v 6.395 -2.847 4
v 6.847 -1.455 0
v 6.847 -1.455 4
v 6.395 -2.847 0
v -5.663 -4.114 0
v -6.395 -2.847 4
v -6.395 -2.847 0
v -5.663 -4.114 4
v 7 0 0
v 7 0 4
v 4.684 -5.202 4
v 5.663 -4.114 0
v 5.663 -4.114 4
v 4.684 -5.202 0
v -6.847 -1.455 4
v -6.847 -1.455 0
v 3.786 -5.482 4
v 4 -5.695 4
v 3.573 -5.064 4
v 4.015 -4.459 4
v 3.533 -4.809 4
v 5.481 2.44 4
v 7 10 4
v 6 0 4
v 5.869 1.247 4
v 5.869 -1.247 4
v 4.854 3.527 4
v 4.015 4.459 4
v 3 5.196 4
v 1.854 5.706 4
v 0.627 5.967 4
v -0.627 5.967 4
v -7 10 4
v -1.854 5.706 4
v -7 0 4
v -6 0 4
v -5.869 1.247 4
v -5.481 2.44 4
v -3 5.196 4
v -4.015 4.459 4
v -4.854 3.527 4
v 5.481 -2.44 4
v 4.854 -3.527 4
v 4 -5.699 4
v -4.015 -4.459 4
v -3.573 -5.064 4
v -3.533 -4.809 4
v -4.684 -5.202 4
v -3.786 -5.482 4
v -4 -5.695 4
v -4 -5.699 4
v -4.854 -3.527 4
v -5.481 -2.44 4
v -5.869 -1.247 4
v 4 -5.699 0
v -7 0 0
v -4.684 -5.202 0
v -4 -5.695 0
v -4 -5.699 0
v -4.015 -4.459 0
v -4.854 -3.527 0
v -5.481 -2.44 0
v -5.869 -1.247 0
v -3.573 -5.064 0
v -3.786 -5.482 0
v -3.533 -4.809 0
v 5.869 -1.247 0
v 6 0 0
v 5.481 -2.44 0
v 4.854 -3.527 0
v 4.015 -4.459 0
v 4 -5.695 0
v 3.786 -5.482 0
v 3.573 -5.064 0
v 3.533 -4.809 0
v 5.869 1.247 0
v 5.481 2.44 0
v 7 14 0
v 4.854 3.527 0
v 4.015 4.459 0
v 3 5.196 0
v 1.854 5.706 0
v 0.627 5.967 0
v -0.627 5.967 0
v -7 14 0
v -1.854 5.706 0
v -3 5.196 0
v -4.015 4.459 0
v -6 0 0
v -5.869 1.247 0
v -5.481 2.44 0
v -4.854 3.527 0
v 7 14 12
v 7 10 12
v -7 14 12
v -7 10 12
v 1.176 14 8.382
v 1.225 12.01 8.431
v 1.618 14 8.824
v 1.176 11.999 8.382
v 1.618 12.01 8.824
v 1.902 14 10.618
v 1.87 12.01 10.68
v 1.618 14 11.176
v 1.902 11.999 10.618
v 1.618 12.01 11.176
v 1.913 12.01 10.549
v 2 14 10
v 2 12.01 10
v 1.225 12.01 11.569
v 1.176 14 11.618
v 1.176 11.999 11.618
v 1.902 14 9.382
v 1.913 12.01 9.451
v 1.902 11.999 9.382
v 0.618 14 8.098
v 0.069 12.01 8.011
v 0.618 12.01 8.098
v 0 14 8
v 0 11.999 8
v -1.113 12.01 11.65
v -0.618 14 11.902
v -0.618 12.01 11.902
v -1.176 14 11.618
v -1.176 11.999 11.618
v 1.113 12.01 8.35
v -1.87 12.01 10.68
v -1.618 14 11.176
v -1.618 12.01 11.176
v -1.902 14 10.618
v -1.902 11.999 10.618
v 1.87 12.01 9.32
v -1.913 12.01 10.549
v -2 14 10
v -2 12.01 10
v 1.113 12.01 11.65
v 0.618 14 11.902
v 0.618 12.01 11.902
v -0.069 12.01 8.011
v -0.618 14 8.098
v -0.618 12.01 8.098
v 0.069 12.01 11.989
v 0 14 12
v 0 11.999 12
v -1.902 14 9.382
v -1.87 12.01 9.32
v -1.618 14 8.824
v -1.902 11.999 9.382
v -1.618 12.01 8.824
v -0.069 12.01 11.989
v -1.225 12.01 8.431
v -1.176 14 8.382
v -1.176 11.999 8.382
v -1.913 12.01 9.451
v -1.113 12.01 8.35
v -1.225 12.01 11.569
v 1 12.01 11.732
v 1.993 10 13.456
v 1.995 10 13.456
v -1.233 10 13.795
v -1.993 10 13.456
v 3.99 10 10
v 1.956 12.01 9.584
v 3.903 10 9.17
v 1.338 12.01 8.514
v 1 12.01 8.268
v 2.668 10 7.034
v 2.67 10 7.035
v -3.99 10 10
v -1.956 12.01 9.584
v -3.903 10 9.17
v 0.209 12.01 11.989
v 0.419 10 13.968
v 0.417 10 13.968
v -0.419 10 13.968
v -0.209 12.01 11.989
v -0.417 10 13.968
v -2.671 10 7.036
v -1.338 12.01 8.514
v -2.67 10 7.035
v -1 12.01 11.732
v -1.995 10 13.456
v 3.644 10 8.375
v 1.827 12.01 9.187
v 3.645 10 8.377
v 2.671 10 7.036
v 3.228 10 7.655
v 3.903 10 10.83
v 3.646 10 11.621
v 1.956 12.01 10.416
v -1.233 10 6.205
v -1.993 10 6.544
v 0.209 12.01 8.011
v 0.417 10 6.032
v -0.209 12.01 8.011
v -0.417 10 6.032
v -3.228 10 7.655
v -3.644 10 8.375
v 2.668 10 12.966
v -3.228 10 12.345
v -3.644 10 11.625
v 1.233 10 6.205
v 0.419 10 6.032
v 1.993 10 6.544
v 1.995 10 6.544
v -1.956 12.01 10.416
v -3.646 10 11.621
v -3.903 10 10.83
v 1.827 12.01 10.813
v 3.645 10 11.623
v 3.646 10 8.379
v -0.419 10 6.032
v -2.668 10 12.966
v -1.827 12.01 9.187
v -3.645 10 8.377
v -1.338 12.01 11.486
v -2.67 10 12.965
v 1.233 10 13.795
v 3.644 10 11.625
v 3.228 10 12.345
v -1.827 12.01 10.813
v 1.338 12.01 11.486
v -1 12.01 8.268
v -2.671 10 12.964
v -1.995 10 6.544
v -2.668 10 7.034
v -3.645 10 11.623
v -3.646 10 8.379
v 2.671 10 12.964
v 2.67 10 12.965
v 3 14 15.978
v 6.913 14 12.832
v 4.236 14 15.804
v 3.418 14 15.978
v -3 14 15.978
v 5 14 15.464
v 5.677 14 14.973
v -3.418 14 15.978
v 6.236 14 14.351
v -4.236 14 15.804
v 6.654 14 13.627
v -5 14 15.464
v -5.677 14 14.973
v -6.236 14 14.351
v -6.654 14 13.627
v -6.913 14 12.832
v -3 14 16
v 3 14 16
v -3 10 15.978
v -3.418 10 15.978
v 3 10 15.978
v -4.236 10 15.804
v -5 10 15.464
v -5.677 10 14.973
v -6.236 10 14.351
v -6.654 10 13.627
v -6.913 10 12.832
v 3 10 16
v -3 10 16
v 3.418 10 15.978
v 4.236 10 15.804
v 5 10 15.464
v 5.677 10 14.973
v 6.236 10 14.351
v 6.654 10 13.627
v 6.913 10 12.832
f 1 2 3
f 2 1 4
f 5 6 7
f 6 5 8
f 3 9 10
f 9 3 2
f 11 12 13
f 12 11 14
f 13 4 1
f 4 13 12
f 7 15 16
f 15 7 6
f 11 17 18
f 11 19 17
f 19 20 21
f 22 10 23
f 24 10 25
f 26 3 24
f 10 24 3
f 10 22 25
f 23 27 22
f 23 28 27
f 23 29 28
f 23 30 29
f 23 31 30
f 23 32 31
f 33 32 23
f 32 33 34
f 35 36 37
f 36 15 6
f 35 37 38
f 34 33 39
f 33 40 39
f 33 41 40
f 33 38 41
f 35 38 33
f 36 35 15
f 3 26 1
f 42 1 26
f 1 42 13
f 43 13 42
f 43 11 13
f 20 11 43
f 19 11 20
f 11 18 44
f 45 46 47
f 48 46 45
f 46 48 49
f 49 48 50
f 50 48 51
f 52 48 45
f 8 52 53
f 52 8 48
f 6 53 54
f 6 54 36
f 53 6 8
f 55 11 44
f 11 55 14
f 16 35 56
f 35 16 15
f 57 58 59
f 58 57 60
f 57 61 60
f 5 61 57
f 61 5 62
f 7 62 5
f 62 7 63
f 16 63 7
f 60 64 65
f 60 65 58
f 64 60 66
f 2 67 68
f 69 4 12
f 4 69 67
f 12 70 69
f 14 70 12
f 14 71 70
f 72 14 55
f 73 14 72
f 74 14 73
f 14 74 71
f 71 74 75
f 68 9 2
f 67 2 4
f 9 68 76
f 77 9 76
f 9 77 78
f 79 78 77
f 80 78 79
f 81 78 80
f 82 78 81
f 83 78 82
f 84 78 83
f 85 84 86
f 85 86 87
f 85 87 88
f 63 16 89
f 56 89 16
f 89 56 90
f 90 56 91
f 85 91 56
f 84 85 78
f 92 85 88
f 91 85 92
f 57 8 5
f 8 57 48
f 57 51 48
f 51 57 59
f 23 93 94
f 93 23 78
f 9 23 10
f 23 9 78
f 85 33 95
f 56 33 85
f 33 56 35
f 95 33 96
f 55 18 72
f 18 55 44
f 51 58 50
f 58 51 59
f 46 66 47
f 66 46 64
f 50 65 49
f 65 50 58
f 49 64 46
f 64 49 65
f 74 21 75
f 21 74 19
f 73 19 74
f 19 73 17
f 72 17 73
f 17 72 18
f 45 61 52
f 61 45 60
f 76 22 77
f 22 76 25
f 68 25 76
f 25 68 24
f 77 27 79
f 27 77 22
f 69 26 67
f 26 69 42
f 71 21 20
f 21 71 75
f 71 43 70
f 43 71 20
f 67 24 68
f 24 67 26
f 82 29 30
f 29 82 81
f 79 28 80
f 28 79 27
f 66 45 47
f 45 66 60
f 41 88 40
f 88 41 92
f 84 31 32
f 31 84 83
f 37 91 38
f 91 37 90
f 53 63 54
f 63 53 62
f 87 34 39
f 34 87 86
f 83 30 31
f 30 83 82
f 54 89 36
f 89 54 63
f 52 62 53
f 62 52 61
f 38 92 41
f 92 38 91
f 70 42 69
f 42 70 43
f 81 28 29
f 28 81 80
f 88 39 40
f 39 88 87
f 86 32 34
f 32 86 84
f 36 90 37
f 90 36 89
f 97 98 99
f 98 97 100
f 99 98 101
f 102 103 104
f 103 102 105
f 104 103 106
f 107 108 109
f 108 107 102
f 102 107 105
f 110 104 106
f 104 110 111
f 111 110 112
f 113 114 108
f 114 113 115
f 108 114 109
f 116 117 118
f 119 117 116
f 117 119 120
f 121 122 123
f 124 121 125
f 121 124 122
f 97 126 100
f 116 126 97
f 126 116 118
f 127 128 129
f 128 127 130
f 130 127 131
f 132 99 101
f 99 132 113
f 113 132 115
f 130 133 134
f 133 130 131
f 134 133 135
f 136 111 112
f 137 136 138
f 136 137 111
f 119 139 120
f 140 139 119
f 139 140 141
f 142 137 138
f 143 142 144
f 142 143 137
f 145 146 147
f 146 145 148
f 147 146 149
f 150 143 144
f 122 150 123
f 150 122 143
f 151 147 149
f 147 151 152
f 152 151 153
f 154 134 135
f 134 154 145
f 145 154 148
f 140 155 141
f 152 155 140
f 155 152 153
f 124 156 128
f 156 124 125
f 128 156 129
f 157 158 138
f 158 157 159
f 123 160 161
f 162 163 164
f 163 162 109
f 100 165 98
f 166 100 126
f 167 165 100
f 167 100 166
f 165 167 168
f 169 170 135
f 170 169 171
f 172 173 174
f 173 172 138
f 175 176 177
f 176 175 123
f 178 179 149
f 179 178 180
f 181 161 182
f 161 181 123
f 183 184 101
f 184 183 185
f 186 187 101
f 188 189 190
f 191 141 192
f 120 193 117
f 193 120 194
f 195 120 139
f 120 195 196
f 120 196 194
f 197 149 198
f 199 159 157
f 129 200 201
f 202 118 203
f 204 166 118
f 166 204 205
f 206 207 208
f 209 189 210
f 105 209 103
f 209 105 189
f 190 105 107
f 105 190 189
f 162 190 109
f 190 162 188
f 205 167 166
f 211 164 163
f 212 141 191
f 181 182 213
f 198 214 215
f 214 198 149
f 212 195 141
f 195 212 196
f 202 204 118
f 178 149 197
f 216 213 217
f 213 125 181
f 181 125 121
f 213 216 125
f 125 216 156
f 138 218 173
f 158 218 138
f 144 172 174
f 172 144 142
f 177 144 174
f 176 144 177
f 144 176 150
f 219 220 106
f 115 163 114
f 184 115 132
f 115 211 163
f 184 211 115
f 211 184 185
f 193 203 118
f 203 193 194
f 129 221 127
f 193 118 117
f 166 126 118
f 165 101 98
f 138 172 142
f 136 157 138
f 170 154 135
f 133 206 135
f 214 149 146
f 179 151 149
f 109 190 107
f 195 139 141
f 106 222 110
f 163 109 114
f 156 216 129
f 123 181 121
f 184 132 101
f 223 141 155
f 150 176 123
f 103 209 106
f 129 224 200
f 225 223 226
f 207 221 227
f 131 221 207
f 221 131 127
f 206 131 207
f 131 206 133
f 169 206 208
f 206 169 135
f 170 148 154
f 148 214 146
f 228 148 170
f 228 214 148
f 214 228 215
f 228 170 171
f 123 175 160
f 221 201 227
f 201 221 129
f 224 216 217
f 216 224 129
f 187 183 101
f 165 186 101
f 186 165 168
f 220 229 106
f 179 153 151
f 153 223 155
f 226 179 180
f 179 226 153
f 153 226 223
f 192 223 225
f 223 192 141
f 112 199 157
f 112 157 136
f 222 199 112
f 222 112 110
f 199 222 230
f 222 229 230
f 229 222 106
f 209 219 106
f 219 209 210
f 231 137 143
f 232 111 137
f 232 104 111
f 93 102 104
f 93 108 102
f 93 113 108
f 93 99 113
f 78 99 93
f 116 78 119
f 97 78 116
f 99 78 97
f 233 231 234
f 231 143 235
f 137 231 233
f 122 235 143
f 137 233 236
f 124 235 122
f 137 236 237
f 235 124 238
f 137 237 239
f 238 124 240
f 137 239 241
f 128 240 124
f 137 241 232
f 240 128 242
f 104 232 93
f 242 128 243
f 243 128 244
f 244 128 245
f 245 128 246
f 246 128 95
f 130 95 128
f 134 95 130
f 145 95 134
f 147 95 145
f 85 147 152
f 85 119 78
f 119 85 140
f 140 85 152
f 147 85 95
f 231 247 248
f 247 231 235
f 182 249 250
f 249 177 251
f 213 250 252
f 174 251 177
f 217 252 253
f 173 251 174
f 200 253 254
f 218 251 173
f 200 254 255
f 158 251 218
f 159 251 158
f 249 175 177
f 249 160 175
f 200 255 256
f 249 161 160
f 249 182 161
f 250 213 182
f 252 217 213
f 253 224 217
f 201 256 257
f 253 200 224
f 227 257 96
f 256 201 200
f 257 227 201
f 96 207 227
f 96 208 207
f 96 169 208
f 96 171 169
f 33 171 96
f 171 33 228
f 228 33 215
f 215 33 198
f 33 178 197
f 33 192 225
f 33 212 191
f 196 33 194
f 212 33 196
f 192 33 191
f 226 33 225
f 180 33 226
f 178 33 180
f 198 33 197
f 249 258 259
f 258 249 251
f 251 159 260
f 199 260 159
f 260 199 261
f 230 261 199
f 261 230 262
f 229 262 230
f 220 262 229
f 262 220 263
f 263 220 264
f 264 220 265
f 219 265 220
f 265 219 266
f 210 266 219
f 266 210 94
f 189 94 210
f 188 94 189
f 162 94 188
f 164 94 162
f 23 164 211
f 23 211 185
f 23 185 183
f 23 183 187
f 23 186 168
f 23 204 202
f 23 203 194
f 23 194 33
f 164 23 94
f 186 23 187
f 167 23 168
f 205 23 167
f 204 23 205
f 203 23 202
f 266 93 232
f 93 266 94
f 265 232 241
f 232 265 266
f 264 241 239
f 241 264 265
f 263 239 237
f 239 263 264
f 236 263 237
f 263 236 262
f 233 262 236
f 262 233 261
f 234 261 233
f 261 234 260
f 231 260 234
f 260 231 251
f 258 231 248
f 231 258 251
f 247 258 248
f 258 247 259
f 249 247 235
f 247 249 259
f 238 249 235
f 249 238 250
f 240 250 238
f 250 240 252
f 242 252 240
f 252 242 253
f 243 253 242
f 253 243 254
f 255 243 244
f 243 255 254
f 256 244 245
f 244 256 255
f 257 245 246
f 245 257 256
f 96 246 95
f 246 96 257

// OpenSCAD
*translate([-40,-10]) difference(){
  union(){
    cylinder(d=44,h=4,$fn=80);
    translate([-22,0]) cube([44,22,4]);
  }
  translate([0,0,-.01]) cylinder(d=40,h=4.02,$fn=80);
  difference(){
    translate([-16,-22.01,-.01]) cube([32,10,4.02]);
    translate([-17,-13.5,-.02]) cylinder(d=4,h=4.04,$fn=20);
    translate([17,-13.5,-.02]) cylinder(d=4,h=4.04,$fn=20);
  }
}
difference(){
  union(){
    cylinder(d=14,h=4,$fn=30);
    translate([-7,0]) cube([14,12,4]);
  }
  translate([0,0,-.01]) {
    cylinder(d=12,h=4.02,$fn=30);
    difference(){
      translate([-4,-8]) cube([8,8,4.02]);
      translate([-5,-4.6,-.01]) cylinder(d=3,h=4.04,$fn=20);
      translate([5,-4.6,-.01]) cylinder(d=3,h=4.04,$fn=20);
    }
  }
}
translate([-62,10]) {
  difference(){
    bw=14;
    *cube([bw,4,20]);
    translate([55,4]) rotate([90,0]) linear_extrude(4) union(){
      square([bw,12]);
      translate([4,12]) circle(d=8,$fn=30);
      translate([bw-4,12]) circle(d=8,$fn=30);
      translate([4,12]) square([bw-8,4]);
    }
    translate([0,4.01]) rotate([90,0]) union(){
      for(x=[6,62])
      translate([x,10]) {
        cylinder(d=4,h=4.02,$fn=20);
        translate([0,0,2]) cylinder(d1=4,d2=8,h=2.02,$fn=30);
      }
    }
  }
}
